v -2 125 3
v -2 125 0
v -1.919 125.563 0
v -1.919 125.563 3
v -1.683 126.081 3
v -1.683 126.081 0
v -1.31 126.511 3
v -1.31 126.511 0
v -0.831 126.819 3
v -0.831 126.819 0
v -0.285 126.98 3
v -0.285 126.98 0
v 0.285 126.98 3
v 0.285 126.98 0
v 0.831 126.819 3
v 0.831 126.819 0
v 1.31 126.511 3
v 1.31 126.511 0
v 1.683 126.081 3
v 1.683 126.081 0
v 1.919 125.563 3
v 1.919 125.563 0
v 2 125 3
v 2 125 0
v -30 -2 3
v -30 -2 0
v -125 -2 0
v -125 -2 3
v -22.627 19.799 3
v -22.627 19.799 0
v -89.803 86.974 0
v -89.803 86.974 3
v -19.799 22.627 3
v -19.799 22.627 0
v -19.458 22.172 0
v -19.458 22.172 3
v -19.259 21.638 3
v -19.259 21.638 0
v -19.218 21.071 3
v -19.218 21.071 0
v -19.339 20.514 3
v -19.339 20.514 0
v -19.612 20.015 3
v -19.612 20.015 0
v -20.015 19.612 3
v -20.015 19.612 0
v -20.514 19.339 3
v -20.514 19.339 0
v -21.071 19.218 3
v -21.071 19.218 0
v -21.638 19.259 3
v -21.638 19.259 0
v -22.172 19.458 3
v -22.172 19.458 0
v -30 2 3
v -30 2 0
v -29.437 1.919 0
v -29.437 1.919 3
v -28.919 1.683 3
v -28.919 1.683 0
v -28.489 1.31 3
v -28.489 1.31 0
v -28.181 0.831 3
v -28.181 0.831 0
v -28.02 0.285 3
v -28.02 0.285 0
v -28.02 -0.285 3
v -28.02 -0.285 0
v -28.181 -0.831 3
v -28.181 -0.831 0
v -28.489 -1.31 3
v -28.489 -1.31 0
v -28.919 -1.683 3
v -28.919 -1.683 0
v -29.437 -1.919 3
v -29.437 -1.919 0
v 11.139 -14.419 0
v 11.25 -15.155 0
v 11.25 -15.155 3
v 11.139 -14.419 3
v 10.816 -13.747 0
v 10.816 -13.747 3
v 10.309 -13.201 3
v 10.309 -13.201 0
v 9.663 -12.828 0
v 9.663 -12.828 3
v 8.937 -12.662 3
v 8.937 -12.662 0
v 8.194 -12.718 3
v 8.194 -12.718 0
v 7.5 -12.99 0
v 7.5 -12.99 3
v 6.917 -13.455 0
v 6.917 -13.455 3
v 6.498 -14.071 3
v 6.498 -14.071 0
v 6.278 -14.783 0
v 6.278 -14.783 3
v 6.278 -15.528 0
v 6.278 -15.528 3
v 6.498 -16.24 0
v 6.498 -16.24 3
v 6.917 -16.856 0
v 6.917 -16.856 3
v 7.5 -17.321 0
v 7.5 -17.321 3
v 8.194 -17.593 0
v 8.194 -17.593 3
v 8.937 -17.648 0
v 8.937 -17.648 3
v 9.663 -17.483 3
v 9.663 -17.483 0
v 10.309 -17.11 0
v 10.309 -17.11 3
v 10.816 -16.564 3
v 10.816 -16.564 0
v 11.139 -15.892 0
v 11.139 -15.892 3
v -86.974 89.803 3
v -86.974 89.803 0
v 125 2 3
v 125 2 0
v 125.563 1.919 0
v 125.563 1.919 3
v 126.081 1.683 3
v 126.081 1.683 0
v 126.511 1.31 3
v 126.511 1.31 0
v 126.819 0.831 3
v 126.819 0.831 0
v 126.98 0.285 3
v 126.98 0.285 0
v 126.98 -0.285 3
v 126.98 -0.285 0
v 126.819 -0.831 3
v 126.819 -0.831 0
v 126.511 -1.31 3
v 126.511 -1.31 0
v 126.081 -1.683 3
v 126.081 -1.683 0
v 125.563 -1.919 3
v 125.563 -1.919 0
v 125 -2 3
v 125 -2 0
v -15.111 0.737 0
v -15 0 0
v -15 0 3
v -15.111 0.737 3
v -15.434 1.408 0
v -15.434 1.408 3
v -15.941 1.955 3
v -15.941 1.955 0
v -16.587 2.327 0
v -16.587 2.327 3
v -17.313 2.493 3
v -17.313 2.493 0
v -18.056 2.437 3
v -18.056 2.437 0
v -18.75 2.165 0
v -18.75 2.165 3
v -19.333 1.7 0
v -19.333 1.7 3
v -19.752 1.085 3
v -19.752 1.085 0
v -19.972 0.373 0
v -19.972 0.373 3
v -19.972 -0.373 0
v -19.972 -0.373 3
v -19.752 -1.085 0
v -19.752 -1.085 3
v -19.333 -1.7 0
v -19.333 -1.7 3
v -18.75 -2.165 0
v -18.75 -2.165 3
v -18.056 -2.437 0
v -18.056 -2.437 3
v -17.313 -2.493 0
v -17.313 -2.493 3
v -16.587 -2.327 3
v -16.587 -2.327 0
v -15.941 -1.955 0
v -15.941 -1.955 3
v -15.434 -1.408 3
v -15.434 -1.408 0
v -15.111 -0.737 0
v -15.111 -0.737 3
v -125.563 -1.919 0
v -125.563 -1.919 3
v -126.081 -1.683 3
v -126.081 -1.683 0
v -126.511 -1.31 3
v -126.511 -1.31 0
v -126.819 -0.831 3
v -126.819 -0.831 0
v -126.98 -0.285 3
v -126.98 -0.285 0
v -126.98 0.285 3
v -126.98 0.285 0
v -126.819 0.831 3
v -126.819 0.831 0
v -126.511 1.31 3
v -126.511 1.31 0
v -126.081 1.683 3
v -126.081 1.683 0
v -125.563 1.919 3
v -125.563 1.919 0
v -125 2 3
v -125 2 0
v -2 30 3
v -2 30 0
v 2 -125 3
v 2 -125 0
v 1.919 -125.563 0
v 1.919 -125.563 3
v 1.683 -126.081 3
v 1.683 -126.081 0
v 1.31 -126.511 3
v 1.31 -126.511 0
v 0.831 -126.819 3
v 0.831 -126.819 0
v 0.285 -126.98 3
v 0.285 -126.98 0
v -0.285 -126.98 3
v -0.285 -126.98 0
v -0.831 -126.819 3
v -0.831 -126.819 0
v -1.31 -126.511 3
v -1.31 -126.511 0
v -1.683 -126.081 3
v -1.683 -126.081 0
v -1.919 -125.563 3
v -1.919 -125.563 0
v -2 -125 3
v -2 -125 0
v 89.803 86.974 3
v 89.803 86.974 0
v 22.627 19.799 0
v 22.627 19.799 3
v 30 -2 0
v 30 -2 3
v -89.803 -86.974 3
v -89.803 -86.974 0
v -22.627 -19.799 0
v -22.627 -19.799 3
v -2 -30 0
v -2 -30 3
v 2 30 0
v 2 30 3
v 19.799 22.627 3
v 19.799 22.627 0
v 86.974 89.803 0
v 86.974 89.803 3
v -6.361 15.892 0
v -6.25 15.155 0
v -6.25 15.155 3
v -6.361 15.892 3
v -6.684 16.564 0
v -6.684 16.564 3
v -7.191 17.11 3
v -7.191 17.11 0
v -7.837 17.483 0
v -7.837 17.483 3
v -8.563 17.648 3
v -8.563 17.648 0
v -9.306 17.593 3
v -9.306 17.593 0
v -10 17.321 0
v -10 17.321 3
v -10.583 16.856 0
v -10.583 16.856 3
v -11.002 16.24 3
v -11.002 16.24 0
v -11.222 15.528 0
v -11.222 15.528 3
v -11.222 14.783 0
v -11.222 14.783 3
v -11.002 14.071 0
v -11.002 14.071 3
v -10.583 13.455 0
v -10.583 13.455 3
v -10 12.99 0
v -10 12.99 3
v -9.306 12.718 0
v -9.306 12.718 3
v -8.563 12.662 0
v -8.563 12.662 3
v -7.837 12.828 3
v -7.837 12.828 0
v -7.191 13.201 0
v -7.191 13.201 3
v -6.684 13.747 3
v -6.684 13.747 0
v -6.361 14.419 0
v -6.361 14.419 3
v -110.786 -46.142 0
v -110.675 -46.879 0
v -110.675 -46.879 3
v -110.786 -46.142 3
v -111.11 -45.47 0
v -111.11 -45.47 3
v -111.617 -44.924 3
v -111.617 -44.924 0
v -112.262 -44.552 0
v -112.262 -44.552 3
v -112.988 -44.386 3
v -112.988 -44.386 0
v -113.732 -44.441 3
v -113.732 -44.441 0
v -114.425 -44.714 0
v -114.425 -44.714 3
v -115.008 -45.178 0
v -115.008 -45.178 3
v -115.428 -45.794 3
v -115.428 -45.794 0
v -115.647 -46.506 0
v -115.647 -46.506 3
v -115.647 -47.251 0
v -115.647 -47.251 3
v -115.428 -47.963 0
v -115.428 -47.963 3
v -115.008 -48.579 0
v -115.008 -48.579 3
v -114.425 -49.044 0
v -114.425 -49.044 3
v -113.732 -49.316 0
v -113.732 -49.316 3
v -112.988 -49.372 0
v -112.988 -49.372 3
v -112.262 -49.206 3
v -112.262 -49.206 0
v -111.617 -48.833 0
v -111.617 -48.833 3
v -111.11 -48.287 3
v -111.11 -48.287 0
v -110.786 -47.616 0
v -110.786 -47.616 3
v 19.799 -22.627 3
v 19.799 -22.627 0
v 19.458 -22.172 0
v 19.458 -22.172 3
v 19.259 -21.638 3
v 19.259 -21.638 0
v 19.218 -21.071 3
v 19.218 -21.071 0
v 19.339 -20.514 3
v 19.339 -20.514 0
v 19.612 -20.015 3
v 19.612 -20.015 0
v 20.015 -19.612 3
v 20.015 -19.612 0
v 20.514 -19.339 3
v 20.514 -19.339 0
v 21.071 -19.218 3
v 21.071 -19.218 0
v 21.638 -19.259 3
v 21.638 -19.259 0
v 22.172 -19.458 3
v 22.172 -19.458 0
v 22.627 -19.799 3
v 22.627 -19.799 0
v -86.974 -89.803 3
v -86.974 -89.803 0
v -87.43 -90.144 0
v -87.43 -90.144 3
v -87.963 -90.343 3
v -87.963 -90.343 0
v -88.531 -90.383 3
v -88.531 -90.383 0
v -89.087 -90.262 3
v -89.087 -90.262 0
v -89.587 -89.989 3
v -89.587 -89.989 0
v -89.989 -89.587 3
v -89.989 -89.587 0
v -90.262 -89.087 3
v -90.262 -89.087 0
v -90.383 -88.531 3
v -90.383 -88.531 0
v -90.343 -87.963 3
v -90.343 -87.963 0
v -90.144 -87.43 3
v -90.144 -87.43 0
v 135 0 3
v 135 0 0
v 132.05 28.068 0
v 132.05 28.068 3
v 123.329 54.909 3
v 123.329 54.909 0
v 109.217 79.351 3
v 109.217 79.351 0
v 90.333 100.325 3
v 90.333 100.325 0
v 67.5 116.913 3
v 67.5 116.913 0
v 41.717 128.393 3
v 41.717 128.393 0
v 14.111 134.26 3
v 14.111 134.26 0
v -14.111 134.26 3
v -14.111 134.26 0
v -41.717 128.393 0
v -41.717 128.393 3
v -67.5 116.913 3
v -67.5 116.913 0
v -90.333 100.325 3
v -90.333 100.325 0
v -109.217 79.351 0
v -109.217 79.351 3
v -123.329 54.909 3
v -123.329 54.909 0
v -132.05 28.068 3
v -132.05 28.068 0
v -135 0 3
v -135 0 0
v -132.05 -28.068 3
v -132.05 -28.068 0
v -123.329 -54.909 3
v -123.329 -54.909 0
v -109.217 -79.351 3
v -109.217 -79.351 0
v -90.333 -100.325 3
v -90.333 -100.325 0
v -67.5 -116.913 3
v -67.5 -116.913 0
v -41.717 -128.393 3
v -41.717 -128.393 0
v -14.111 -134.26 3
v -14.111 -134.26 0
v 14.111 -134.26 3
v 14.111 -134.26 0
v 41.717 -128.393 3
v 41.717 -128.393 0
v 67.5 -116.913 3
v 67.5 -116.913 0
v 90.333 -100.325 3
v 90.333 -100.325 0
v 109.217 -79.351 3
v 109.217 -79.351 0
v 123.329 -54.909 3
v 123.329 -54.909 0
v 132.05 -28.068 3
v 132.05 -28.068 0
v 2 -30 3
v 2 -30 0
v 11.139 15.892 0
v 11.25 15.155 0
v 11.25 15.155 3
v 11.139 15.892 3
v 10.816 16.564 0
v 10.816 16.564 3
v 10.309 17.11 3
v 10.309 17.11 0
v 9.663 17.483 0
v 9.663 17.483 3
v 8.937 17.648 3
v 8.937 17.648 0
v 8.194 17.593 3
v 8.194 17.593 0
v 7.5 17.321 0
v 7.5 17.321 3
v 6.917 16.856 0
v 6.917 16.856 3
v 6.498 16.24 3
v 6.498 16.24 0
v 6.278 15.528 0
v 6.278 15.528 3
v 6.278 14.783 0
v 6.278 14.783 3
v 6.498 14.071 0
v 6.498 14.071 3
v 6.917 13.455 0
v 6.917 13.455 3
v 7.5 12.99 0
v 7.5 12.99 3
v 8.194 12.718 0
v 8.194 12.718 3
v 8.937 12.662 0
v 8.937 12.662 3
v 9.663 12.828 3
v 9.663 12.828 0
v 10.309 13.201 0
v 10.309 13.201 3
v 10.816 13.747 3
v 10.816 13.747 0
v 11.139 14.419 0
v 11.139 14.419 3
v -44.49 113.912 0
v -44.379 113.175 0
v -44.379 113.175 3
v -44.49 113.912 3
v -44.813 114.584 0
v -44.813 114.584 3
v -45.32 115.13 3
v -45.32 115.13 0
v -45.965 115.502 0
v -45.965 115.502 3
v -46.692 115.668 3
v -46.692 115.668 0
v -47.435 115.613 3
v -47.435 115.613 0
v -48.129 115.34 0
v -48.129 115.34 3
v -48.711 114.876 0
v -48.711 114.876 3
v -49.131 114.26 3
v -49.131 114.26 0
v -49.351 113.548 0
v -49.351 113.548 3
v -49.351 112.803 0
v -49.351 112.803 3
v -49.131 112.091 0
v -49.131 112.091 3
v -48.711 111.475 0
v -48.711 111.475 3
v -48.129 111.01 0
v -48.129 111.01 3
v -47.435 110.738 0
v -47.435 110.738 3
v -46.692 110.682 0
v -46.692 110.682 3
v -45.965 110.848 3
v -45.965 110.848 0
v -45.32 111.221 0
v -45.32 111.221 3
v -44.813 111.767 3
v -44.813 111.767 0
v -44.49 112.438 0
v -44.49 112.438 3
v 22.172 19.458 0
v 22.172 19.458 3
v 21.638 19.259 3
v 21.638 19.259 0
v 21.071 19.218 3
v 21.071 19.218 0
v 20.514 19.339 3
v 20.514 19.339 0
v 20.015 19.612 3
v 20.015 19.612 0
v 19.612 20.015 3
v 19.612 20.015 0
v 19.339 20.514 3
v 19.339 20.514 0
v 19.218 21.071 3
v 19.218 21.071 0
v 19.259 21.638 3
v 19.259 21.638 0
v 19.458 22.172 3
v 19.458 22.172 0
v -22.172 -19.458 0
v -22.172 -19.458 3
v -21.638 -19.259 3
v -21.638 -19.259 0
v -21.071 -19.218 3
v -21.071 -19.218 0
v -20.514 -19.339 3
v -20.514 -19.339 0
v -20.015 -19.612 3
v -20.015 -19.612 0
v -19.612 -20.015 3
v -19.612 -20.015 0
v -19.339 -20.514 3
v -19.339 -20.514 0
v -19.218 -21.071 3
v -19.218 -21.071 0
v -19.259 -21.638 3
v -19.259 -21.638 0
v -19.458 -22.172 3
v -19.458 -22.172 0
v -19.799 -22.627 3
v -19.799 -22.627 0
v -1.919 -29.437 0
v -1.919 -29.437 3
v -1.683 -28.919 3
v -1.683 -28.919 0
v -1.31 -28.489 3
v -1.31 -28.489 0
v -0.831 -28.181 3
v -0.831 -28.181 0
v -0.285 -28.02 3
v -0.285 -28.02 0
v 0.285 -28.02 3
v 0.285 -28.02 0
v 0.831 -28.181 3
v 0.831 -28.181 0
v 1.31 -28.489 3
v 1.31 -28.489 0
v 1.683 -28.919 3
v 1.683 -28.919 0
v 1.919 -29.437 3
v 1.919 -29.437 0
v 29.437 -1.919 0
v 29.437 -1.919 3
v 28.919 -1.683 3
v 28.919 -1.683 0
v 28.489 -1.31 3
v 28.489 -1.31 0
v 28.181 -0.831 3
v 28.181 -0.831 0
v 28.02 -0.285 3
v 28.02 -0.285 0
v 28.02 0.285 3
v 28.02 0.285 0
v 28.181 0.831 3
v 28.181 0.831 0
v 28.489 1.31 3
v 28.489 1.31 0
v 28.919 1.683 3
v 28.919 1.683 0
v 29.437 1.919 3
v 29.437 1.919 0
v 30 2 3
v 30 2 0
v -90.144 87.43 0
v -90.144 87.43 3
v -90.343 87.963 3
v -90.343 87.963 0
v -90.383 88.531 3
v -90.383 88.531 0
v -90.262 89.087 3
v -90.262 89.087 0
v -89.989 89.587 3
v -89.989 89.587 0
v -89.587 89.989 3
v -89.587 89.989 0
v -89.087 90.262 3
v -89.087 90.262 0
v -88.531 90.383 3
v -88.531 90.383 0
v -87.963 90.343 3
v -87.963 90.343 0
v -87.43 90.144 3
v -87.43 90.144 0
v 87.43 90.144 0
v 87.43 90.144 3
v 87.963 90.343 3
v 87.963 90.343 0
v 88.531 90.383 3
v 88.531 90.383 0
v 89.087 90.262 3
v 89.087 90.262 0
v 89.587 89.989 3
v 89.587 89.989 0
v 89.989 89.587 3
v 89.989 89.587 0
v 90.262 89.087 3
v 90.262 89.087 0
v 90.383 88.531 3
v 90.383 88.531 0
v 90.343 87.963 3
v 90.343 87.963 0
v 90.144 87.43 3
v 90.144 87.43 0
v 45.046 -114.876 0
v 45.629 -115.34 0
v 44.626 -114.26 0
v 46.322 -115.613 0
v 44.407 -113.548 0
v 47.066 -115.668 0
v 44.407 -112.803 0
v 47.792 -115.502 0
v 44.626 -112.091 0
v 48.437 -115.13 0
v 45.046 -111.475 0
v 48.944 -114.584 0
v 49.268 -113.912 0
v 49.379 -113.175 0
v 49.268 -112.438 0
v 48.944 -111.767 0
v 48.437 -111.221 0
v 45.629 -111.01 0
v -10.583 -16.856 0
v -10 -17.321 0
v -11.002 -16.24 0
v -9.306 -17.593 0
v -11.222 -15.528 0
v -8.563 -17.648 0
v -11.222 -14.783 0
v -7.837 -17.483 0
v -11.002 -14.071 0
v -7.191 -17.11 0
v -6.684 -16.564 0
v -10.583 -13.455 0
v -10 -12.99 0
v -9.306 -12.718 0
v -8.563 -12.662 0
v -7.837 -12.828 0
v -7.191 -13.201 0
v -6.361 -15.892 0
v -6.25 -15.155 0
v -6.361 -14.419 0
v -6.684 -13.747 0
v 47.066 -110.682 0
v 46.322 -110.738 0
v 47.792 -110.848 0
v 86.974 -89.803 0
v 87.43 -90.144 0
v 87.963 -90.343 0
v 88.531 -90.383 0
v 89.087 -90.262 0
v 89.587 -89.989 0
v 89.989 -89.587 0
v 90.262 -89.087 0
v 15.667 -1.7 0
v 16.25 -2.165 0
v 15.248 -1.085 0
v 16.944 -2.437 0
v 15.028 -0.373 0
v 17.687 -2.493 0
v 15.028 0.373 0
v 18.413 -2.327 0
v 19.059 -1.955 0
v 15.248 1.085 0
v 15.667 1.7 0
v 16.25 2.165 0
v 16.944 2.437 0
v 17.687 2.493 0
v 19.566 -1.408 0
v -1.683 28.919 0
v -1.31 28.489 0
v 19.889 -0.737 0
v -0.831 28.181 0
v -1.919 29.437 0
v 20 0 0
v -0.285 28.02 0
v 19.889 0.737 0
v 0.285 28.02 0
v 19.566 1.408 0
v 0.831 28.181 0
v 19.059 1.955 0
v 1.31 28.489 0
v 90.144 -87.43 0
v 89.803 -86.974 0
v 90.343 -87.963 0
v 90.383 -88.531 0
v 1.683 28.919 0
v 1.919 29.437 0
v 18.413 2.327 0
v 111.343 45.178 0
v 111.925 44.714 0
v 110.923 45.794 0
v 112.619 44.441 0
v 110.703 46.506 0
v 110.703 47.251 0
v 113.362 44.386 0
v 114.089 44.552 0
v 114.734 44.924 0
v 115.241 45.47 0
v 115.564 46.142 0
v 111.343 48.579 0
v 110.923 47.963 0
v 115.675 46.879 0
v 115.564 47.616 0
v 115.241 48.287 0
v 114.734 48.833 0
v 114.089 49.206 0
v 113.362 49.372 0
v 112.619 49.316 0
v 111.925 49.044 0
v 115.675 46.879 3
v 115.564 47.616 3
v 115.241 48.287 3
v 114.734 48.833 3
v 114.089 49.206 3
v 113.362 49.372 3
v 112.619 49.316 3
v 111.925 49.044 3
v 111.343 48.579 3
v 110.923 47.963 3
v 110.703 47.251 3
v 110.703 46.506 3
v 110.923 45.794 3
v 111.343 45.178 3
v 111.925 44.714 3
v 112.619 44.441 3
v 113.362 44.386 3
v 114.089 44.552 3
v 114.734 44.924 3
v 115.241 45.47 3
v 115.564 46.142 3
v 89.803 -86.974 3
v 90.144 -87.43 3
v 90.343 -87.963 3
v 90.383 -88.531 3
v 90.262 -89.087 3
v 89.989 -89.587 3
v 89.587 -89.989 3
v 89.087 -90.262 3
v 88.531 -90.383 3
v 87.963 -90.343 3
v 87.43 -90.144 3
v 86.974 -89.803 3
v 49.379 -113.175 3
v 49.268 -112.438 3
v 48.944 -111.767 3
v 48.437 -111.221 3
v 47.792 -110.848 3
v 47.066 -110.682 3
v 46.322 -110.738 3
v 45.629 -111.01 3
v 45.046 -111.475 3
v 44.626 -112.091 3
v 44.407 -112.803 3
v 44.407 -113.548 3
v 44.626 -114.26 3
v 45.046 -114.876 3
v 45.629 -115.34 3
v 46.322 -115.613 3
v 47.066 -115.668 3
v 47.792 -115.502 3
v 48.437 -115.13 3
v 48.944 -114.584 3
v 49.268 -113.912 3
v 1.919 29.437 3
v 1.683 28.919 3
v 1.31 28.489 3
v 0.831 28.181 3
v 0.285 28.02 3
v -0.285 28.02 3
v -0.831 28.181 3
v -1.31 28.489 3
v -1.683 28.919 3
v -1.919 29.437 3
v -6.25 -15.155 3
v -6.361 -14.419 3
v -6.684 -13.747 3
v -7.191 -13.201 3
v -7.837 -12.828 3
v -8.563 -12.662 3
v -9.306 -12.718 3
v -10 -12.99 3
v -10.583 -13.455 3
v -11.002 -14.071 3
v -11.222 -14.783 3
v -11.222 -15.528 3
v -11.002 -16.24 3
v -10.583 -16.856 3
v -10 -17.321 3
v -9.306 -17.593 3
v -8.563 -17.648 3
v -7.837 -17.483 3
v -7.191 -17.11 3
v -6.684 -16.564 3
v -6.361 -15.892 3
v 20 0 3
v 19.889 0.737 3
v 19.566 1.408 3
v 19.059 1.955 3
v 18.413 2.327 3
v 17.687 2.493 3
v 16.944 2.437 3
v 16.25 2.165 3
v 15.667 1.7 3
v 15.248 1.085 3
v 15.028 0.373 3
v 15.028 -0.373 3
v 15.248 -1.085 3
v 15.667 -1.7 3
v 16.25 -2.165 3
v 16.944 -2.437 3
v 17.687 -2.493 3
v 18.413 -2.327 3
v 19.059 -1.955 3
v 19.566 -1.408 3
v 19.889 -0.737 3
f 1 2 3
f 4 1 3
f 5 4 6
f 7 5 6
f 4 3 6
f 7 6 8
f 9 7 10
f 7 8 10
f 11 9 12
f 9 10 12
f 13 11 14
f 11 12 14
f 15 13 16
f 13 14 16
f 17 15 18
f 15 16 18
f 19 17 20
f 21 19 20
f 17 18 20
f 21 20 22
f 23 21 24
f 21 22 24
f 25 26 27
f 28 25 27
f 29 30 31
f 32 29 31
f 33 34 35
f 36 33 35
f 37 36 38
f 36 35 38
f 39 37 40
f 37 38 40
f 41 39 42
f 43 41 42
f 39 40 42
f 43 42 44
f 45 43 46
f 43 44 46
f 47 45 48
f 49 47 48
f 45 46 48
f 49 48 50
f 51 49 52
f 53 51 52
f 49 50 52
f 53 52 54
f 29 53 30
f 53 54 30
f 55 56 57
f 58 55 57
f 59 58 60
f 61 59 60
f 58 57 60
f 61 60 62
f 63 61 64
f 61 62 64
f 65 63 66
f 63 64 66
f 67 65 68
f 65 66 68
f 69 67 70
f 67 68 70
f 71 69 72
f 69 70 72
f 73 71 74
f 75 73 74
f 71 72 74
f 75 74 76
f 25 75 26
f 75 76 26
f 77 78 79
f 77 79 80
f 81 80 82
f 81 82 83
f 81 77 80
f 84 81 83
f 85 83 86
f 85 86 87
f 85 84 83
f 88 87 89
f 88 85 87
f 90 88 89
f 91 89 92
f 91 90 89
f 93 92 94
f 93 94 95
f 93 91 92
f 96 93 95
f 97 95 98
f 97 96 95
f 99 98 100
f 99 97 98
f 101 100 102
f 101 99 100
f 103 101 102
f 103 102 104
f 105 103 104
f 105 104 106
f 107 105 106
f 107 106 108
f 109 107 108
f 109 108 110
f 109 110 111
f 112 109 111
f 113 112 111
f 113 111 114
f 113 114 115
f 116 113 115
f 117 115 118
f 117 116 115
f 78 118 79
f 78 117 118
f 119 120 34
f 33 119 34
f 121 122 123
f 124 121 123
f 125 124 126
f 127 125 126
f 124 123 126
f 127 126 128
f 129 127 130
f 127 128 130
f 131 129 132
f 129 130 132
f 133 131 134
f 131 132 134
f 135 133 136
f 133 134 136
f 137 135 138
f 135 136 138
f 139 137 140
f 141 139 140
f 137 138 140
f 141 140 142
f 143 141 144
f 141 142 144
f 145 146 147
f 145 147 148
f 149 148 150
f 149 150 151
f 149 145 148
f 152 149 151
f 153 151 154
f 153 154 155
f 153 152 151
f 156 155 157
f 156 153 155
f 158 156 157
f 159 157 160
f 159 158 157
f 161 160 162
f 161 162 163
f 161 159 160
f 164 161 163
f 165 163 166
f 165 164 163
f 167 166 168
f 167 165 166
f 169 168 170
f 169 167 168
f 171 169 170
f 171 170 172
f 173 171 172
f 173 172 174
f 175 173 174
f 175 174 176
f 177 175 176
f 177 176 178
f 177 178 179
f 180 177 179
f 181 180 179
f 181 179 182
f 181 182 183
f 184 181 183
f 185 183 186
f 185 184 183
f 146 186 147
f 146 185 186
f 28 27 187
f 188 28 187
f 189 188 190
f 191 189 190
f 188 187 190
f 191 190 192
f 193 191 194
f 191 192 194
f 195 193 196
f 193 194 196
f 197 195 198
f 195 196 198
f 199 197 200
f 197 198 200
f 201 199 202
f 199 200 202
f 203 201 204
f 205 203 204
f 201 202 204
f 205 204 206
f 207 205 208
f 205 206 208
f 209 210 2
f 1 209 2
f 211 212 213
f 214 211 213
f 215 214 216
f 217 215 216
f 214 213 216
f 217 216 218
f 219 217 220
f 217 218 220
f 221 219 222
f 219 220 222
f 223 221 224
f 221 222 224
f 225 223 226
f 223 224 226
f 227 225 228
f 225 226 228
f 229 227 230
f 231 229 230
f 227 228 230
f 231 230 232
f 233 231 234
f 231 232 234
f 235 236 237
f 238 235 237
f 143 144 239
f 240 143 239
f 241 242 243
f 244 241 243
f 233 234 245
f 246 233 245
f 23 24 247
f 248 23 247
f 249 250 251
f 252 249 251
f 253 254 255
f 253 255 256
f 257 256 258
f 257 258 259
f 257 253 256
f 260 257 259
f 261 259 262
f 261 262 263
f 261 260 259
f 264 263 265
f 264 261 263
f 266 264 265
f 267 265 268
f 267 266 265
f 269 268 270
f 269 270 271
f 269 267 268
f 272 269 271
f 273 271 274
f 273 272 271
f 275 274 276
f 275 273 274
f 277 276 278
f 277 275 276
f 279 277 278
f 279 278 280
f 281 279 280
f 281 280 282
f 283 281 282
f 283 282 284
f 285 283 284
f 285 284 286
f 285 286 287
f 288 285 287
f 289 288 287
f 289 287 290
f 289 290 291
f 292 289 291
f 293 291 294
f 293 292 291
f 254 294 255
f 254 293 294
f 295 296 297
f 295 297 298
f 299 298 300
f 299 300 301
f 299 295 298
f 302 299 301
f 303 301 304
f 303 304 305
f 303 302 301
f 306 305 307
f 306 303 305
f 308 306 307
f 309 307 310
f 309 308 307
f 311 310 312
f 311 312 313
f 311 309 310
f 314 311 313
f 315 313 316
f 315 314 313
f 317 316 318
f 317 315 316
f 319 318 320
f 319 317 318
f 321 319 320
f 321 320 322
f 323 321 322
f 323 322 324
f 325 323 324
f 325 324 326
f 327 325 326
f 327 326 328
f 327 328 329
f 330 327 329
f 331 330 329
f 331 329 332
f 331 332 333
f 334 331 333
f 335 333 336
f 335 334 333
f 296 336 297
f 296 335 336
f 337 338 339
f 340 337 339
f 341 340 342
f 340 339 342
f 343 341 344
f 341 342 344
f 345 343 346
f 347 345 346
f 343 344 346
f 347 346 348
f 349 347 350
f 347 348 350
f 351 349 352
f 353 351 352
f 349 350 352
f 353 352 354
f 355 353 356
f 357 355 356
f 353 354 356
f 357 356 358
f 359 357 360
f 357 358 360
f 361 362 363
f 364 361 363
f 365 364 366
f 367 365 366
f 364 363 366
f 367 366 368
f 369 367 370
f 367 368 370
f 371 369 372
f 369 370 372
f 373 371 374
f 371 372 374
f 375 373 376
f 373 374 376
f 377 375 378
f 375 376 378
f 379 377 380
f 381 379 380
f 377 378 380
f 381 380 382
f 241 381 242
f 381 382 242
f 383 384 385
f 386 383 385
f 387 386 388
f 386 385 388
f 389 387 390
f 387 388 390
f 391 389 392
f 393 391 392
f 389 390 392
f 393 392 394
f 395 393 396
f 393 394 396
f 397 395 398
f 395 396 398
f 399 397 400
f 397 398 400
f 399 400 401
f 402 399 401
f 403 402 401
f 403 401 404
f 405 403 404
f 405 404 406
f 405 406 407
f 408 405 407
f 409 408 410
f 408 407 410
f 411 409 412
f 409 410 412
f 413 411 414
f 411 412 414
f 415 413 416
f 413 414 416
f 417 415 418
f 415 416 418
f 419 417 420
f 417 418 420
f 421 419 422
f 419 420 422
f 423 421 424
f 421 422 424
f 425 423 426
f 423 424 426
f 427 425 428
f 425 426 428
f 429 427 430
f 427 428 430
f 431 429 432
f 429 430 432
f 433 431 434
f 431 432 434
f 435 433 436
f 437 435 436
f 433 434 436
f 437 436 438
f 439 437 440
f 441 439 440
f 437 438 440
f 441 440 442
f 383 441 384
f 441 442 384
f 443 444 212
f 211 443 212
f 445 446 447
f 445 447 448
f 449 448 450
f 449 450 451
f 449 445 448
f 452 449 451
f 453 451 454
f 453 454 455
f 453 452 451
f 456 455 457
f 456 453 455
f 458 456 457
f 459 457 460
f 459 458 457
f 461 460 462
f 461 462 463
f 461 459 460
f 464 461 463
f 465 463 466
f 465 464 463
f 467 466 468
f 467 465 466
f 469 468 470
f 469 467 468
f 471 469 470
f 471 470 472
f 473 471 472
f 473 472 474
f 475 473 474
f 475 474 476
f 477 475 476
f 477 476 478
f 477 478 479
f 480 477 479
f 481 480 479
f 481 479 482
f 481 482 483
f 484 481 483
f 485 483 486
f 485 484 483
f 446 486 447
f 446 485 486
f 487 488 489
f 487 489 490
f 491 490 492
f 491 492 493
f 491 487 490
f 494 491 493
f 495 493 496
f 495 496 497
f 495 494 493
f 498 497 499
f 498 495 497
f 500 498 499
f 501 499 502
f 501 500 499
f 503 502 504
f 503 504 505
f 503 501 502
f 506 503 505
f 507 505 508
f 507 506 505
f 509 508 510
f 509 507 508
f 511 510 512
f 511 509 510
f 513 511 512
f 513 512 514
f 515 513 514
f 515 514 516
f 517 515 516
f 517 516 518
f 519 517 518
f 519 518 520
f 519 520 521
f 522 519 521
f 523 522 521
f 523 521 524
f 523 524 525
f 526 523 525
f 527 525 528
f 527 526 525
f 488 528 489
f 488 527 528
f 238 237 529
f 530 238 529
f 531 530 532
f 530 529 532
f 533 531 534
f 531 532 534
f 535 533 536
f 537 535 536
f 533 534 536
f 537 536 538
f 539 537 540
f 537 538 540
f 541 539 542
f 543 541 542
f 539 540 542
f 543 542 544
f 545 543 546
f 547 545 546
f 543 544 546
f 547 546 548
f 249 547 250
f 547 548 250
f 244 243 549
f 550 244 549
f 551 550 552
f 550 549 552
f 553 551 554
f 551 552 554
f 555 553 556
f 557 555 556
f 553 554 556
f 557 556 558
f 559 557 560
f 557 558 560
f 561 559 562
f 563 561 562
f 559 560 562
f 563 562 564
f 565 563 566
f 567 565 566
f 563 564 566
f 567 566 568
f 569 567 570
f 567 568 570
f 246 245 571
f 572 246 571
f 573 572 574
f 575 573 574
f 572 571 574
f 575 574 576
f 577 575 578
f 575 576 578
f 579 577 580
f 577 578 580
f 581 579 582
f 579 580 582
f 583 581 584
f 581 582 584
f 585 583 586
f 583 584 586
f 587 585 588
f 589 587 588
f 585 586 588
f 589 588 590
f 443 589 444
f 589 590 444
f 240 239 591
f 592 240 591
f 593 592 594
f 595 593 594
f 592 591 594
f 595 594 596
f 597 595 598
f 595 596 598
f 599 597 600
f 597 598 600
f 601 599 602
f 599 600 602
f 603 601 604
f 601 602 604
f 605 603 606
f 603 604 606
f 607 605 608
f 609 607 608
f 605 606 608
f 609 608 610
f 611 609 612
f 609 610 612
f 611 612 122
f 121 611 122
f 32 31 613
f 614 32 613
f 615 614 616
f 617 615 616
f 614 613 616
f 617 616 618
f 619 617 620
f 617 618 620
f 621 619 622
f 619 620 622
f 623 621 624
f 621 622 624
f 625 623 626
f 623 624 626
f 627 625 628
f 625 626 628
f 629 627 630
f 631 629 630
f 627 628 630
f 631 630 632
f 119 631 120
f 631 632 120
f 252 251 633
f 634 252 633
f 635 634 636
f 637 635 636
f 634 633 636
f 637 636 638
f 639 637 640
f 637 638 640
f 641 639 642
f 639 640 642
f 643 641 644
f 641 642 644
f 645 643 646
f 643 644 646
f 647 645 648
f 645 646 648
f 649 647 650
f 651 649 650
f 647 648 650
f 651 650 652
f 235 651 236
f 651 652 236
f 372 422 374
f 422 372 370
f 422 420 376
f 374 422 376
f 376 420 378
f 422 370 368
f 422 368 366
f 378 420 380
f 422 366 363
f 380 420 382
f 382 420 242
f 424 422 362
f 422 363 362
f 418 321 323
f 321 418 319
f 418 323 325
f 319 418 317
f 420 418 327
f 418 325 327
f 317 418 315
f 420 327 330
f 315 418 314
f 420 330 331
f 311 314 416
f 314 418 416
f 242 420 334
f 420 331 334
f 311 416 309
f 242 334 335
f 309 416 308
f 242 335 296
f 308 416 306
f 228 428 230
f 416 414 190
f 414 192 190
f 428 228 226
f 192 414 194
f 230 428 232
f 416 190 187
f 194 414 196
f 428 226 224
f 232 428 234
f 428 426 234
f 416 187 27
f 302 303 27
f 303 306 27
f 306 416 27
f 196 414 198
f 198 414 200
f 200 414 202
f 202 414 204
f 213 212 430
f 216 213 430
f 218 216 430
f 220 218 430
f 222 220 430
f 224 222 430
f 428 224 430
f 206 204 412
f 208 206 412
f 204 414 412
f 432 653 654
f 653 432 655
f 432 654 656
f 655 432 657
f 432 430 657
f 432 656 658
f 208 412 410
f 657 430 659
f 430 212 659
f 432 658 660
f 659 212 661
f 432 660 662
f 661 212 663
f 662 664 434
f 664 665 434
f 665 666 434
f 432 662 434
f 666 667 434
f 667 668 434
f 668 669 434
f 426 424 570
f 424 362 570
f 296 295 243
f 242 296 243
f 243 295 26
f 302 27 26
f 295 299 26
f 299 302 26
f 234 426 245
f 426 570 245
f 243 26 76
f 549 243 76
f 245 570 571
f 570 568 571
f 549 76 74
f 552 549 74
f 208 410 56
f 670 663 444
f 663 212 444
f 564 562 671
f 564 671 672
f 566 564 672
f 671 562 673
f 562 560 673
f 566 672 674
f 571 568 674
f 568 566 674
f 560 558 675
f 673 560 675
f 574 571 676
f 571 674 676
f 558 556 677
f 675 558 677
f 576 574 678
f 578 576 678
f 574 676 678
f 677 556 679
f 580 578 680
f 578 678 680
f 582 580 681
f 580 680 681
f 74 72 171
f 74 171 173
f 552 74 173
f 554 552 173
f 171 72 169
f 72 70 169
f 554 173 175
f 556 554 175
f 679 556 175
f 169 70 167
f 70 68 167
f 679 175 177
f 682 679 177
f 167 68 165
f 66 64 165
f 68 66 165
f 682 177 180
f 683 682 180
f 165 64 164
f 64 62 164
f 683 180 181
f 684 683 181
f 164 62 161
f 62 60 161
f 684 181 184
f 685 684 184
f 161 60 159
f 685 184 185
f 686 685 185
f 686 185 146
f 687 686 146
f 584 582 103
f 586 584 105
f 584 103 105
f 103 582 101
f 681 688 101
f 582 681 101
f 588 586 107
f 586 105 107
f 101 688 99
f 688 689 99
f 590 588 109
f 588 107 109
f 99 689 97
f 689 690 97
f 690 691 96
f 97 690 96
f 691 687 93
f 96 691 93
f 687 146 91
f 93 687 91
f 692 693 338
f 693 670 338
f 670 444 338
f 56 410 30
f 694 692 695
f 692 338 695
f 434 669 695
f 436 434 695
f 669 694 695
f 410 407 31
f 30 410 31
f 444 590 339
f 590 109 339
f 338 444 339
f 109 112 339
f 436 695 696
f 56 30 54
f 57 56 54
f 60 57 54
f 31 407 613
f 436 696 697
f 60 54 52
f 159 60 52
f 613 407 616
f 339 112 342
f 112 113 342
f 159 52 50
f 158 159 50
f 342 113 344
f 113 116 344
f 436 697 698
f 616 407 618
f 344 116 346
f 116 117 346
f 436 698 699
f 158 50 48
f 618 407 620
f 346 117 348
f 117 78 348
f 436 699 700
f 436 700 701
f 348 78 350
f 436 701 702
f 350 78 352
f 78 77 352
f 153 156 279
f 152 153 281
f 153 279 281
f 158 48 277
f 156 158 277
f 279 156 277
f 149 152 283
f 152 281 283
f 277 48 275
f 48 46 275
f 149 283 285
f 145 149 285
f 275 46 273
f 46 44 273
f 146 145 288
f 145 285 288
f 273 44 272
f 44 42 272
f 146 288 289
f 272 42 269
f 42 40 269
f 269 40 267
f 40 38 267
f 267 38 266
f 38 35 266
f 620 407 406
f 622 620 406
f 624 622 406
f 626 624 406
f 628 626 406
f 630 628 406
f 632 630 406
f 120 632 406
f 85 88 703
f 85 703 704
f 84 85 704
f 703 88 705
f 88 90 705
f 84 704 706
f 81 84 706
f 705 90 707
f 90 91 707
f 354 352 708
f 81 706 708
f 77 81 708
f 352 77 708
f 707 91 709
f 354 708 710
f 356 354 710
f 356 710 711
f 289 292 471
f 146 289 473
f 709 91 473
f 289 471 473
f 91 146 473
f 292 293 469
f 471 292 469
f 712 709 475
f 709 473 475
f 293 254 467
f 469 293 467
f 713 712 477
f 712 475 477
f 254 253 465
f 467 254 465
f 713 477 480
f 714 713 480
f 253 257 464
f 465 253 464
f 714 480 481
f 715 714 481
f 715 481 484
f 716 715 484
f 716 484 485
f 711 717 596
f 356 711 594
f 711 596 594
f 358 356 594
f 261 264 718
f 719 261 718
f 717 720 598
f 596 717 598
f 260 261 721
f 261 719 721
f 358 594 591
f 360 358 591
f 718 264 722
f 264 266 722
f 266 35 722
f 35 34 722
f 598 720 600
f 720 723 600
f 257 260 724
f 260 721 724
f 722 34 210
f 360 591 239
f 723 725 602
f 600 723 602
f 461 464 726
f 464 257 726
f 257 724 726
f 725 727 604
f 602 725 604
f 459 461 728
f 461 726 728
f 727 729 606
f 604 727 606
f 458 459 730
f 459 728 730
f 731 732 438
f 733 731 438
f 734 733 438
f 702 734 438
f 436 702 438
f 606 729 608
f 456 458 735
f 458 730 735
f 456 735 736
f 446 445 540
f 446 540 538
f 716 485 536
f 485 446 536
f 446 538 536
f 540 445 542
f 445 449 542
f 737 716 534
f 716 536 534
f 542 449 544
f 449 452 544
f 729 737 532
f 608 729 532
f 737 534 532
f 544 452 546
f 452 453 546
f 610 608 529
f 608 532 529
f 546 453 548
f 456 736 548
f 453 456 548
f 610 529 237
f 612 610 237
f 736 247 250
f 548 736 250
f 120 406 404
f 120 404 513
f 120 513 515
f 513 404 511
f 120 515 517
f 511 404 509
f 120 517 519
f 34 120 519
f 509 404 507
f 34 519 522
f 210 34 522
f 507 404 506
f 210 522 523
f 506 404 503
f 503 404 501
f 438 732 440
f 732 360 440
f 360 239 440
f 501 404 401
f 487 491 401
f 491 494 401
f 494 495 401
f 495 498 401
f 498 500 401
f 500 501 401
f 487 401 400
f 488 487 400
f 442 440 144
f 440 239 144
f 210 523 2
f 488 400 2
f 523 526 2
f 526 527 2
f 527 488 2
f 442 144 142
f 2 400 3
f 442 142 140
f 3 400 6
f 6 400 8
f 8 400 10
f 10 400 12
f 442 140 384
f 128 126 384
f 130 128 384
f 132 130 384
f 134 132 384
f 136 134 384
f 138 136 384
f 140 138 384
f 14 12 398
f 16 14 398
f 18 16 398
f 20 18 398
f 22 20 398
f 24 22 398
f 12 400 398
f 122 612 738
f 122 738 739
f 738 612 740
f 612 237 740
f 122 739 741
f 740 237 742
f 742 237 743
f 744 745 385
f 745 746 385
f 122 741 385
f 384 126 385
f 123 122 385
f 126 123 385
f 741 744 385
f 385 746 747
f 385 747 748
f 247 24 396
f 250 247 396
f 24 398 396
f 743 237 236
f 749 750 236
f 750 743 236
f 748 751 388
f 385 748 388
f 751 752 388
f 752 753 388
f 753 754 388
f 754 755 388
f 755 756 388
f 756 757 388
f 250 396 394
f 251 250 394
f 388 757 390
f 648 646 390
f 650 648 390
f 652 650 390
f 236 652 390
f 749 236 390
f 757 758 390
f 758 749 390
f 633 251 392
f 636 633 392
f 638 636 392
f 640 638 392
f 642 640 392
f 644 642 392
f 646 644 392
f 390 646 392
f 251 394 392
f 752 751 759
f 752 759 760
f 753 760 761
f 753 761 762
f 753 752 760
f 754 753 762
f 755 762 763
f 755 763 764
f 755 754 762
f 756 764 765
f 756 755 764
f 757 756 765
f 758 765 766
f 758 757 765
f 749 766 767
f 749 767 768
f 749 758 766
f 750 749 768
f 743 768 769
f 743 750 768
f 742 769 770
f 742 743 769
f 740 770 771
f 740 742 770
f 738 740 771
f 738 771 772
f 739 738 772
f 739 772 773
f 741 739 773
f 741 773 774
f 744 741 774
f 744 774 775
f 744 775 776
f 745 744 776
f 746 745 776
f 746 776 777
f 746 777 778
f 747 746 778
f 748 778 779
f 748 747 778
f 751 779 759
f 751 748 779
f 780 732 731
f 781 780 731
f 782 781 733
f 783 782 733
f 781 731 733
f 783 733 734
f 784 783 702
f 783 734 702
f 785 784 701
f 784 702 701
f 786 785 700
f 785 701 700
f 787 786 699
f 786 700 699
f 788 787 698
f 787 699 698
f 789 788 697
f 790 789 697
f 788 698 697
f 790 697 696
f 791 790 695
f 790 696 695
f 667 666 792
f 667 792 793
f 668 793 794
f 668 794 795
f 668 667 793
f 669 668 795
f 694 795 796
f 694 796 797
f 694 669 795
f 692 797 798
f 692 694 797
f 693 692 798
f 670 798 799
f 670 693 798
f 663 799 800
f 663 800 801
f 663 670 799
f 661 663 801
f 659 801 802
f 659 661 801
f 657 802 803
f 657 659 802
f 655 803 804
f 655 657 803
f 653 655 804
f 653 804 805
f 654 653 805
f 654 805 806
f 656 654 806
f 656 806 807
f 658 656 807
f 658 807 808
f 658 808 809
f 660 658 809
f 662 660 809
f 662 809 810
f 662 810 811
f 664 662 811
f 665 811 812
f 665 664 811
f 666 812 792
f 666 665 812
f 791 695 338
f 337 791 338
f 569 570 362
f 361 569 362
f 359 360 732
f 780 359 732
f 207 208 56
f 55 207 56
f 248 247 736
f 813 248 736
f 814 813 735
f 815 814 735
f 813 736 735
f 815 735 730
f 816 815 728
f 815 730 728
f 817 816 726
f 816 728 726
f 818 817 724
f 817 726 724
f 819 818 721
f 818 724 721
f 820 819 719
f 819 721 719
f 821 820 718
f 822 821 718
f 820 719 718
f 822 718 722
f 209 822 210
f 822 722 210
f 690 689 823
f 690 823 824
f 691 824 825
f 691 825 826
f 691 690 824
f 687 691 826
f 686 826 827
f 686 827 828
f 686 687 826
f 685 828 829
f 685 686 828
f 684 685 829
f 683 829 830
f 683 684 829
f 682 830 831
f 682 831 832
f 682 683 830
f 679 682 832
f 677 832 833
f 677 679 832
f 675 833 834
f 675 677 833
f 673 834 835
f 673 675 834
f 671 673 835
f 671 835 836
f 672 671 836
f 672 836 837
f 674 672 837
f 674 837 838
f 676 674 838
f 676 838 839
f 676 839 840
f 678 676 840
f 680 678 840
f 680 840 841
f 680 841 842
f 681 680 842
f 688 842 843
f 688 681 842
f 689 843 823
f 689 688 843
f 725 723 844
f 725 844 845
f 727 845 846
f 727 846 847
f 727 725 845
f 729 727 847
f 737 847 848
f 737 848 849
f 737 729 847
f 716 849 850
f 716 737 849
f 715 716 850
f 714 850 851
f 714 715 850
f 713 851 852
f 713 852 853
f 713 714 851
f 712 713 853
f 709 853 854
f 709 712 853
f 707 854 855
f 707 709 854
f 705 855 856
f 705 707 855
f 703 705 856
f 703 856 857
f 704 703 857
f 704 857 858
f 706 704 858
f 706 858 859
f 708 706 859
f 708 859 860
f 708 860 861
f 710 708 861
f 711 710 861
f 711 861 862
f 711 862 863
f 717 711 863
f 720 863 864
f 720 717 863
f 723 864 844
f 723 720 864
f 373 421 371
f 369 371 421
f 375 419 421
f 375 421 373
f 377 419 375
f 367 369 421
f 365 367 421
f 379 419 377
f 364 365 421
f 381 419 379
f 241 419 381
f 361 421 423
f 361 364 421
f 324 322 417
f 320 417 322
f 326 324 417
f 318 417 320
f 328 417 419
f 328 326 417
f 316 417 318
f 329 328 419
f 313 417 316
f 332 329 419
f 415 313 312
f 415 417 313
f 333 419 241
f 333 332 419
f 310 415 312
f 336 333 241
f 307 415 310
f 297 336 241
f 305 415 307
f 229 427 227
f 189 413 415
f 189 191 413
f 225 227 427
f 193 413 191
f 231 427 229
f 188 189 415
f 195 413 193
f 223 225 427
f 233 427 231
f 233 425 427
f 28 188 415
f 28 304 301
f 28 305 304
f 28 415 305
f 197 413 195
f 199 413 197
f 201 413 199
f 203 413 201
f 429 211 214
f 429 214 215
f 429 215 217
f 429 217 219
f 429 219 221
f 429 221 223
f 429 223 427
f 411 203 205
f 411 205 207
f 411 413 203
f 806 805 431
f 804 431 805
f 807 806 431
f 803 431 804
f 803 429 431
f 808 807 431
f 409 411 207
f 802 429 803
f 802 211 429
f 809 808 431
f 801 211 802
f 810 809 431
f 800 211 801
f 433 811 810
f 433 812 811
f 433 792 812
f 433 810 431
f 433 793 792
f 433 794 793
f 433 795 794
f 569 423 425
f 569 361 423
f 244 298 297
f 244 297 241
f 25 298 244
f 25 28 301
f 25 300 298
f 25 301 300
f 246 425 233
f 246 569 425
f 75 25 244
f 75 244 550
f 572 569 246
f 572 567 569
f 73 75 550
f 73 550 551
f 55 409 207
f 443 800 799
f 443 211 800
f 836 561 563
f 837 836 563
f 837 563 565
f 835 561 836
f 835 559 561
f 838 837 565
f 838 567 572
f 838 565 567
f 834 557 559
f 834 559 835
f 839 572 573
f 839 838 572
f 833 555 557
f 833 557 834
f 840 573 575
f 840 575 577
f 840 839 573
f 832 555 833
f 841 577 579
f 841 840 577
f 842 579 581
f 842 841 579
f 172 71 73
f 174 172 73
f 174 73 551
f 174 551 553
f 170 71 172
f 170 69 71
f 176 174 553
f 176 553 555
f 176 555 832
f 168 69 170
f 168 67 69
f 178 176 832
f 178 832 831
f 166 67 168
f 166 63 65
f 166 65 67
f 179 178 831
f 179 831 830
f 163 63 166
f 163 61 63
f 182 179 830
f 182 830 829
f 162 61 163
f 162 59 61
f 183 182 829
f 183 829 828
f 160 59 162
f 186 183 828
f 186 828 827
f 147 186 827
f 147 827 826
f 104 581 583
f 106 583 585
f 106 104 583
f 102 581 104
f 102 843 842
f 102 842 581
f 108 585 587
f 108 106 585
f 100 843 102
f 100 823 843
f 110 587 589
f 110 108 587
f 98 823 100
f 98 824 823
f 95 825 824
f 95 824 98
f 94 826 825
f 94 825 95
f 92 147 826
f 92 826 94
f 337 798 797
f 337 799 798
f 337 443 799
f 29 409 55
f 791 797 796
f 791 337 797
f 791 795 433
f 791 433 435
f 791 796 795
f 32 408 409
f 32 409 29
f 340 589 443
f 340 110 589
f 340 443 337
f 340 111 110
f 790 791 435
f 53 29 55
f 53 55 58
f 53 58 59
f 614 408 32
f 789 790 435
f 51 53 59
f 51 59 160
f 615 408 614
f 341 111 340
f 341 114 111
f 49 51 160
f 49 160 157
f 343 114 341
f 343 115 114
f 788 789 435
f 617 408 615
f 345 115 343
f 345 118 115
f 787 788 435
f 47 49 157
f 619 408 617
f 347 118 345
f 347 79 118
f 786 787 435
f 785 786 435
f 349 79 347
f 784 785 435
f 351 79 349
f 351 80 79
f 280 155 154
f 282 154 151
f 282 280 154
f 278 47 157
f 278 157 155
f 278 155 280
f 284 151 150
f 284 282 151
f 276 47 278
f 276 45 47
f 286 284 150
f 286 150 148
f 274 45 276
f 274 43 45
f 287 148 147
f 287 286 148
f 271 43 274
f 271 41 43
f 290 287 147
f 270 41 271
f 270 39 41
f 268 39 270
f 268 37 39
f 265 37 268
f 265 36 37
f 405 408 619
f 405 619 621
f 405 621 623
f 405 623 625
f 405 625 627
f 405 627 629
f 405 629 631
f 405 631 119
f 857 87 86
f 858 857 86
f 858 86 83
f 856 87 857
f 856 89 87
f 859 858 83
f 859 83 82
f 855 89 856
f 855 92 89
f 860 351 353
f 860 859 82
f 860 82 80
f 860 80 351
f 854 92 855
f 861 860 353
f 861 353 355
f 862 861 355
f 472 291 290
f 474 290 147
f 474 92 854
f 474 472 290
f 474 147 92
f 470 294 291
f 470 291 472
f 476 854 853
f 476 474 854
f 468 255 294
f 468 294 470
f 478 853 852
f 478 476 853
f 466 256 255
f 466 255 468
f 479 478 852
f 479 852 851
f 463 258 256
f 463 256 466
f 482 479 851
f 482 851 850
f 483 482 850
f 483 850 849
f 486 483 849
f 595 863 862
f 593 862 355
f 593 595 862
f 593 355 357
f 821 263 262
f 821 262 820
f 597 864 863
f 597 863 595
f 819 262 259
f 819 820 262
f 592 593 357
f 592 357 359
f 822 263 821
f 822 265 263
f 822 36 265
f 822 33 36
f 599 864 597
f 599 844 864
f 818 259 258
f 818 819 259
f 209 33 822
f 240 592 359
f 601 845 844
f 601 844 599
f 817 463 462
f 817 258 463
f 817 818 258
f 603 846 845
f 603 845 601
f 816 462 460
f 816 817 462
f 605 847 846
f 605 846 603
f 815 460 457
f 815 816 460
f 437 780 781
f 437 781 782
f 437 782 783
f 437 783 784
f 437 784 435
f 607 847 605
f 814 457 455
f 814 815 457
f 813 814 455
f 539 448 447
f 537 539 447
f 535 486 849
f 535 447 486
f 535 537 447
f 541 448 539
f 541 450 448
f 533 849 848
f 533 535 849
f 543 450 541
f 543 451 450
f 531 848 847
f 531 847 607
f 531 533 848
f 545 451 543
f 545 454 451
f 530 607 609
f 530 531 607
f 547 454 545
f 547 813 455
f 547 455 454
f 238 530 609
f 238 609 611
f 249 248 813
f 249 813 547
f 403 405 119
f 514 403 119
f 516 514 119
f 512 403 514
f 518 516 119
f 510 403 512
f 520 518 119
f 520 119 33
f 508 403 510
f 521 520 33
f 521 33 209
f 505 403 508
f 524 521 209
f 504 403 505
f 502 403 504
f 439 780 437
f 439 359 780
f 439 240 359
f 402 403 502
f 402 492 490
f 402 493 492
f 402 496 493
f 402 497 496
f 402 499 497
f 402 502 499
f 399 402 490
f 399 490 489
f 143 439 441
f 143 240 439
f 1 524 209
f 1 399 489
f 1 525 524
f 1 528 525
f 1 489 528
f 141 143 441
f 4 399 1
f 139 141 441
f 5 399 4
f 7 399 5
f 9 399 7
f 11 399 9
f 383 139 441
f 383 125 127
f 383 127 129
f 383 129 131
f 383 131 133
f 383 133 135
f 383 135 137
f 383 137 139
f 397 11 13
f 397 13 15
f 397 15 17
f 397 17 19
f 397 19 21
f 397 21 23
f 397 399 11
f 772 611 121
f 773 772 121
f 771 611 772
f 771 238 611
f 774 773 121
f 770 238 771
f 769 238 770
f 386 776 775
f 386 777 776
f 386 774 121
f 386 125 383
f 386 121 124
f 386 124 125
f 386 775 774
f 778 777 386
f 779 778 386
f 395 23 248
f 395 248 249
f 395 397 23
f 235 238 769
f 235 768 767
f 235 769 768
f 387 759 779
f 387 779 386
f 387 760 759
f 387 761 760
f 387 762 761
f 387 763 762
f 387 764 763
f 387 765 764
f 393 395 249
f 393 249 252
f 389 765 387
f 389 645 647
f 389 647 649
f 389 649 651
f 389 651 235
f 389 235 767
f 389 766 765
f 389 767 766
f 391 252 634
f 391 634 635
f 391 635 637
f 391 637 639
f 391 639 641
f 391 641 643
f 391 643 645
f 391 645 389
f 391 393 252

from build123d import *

# Parameters (mm, degrees)
SKETCH1_R           = 135
SKETCH1_R_2         = 2.5
BOSS_EXTRUDE1_DEPTH = 3


with BuildPart() as part:
    # Sketch1 → Boss-Extrude1 (new body)
    with BuildSketch(Plane.XY):
        Circle(SKETCH1_R)
        with Locations((-17.5, 0)):
            Circle(SKETCH1_R_2, mode=Mode.SUBTRACT)
        with Locations((-46.878720465, 113.175242733)):
            Circle(SKETCH1_R_2, mode=Mode.SUBTRACT)
        with Locations((113.175242733, 46.878720465)):
            Circle(SKETCH1_R_2, mode=Mode.SUBTRACT)
        with Locations((46.878720465, -113.175242733)):
            Circle(SKETCH1_R_2, mode=Mode.SUBTRACT)
        with Locations((-8.75, 15.155444566)):
            Circle(SKETCH1_R_2, mode=Mode.SUBTRACT)
        with Locations((8.75, 15.155444566)):
            Circle(SKETCH1_R_2, mode=Mode.SUBTRACT)
        with Locations((17.5, 0)):
            Circle(SKETCH1_R_2, mode=Mode.SUBTRACT)
        with Locations((8.75, -15.155444566)):
            Circle(SKETCH1_R_2, mode=Mode.SUBTRACT)
        with Locations((-8.75, -15.155444566)):
            Circle(SKETCH1_R_2, mode=Mode.SUBTRACT)
        with Locations((-113.175242733, -46.878720465)):
            Circle(SKETCH1_R_2, mode=Mode.SUBTRACT)
        with BuildLine():
            Line((30, 2), (125, 2))
            ThreePointArc((125, 2), (127, 0), (125, -2))
            Line((125, -2), (30, -2))
            ThreePointArc((30, -2), (28, 0), (30, 2))
        make_face(mode=Mode.SUBTRACT)
        with BuildLine():
            Line((22.627416998, -19.798989873), (89.802561211, -86.974134086))
            ThreePointArc((89.802561211, -86.974134086), (89.802561211, -89.802561211), (86.974134086, -89.802561211))
            Line((86.974134086, -89.802561211), (19.798989873, -22.627416998))
            ThreePointArc((19.798989873, -22.627416998), (19.798989873, -19.798989873), (22.627416998, -19.798989873))
        make_face(mode=Mode.SUBTRACT)
        with BuildLine():
            Line((2, -30), (2, -125))
            ThreePointArc((2, -125), (0, -127), (-2, -125))
            Line((-2, -125), (-2, -30))
            ThreePointArc((-2, -30), (0, -28), (2, -30))
        make_face(mode=Mode.SUBTRACT)
        with BuildLine():
            Line((-19.798989873, -22.627416998), (-86.974134086, -89.802561211))
            ThreePointArc((-86.974134086, -89.802561211), (-89.802561211, -89.802561211), (-89.802561211, -86.974134086))
            Line((-89.802561211, -86.974134086), (-22.627416998, -19.798989873))
            ThreePointArc((-22.627416998, -19.798989873), (-19.798989873, -19.798989873), (-19.798989873, -22.627416998))
        make_face(mode=Mode.SUBTRACT)
        with BuildLine():
            Line((-30, -2), (-125, -2))
            ThreePointArc((-125, -2), (-127, 0), (-125, 2))
            Line((-125, 2), (-30, 2))
            ThreePointArc((-30, 2), (-28, 0), (-30, -2))
        make_face(mode=Mode.SUBTRACT)
        with BuildLine():
            Line((-22.627416998, 19.798989873), (-89.802561211, 86.974134086))
            ThreePointArc((-89.802561211, 86.974134086), (-89.802561211, 89.802561211), (-86.974134086, 89.802561211))
            Line((-86.974134086, 89.802561211), (-19.798989873, 22.627416998))
            ThreePointArc((-19.798989873, 22.627416998), (-19.798989873, 19.798989873), (-22.627416998, 19.798989873))
        make_face(mode=Mode.SUBTRACT)
        with BuildLine():
            Line((-2, 30), (-2, 125))
            ThreePointArc((-2, 125), (0, 127), (2, 125))
            Line((2, 125), (2, 30))
            ThreePointArc((2, 30), (0, 28), (-2, 30))
        make_face(mode=Mode.SUBTRACT)
        with BuildLine():
            Line((19.798989873, 22.627416998), (86.974134086, 89.802561211))
            ThreePointArc((86.974134086, 89.802561211), (89.802561211, 89.802561211), (89.802561211, 86.974134086))
            Line((89.802561211, 86.974134086), (22.627416998, 19.798989873))
            ThreePointArc((22.627416998, 19.798989873), (19.798989873, 19.798989873), (19.798989873, 22.627416998))
        make_face(mode=Mode.SUBTRACT)
    extrude(amount=BOSS_EXTRUDE1_DEPTH)


solid = part.part
